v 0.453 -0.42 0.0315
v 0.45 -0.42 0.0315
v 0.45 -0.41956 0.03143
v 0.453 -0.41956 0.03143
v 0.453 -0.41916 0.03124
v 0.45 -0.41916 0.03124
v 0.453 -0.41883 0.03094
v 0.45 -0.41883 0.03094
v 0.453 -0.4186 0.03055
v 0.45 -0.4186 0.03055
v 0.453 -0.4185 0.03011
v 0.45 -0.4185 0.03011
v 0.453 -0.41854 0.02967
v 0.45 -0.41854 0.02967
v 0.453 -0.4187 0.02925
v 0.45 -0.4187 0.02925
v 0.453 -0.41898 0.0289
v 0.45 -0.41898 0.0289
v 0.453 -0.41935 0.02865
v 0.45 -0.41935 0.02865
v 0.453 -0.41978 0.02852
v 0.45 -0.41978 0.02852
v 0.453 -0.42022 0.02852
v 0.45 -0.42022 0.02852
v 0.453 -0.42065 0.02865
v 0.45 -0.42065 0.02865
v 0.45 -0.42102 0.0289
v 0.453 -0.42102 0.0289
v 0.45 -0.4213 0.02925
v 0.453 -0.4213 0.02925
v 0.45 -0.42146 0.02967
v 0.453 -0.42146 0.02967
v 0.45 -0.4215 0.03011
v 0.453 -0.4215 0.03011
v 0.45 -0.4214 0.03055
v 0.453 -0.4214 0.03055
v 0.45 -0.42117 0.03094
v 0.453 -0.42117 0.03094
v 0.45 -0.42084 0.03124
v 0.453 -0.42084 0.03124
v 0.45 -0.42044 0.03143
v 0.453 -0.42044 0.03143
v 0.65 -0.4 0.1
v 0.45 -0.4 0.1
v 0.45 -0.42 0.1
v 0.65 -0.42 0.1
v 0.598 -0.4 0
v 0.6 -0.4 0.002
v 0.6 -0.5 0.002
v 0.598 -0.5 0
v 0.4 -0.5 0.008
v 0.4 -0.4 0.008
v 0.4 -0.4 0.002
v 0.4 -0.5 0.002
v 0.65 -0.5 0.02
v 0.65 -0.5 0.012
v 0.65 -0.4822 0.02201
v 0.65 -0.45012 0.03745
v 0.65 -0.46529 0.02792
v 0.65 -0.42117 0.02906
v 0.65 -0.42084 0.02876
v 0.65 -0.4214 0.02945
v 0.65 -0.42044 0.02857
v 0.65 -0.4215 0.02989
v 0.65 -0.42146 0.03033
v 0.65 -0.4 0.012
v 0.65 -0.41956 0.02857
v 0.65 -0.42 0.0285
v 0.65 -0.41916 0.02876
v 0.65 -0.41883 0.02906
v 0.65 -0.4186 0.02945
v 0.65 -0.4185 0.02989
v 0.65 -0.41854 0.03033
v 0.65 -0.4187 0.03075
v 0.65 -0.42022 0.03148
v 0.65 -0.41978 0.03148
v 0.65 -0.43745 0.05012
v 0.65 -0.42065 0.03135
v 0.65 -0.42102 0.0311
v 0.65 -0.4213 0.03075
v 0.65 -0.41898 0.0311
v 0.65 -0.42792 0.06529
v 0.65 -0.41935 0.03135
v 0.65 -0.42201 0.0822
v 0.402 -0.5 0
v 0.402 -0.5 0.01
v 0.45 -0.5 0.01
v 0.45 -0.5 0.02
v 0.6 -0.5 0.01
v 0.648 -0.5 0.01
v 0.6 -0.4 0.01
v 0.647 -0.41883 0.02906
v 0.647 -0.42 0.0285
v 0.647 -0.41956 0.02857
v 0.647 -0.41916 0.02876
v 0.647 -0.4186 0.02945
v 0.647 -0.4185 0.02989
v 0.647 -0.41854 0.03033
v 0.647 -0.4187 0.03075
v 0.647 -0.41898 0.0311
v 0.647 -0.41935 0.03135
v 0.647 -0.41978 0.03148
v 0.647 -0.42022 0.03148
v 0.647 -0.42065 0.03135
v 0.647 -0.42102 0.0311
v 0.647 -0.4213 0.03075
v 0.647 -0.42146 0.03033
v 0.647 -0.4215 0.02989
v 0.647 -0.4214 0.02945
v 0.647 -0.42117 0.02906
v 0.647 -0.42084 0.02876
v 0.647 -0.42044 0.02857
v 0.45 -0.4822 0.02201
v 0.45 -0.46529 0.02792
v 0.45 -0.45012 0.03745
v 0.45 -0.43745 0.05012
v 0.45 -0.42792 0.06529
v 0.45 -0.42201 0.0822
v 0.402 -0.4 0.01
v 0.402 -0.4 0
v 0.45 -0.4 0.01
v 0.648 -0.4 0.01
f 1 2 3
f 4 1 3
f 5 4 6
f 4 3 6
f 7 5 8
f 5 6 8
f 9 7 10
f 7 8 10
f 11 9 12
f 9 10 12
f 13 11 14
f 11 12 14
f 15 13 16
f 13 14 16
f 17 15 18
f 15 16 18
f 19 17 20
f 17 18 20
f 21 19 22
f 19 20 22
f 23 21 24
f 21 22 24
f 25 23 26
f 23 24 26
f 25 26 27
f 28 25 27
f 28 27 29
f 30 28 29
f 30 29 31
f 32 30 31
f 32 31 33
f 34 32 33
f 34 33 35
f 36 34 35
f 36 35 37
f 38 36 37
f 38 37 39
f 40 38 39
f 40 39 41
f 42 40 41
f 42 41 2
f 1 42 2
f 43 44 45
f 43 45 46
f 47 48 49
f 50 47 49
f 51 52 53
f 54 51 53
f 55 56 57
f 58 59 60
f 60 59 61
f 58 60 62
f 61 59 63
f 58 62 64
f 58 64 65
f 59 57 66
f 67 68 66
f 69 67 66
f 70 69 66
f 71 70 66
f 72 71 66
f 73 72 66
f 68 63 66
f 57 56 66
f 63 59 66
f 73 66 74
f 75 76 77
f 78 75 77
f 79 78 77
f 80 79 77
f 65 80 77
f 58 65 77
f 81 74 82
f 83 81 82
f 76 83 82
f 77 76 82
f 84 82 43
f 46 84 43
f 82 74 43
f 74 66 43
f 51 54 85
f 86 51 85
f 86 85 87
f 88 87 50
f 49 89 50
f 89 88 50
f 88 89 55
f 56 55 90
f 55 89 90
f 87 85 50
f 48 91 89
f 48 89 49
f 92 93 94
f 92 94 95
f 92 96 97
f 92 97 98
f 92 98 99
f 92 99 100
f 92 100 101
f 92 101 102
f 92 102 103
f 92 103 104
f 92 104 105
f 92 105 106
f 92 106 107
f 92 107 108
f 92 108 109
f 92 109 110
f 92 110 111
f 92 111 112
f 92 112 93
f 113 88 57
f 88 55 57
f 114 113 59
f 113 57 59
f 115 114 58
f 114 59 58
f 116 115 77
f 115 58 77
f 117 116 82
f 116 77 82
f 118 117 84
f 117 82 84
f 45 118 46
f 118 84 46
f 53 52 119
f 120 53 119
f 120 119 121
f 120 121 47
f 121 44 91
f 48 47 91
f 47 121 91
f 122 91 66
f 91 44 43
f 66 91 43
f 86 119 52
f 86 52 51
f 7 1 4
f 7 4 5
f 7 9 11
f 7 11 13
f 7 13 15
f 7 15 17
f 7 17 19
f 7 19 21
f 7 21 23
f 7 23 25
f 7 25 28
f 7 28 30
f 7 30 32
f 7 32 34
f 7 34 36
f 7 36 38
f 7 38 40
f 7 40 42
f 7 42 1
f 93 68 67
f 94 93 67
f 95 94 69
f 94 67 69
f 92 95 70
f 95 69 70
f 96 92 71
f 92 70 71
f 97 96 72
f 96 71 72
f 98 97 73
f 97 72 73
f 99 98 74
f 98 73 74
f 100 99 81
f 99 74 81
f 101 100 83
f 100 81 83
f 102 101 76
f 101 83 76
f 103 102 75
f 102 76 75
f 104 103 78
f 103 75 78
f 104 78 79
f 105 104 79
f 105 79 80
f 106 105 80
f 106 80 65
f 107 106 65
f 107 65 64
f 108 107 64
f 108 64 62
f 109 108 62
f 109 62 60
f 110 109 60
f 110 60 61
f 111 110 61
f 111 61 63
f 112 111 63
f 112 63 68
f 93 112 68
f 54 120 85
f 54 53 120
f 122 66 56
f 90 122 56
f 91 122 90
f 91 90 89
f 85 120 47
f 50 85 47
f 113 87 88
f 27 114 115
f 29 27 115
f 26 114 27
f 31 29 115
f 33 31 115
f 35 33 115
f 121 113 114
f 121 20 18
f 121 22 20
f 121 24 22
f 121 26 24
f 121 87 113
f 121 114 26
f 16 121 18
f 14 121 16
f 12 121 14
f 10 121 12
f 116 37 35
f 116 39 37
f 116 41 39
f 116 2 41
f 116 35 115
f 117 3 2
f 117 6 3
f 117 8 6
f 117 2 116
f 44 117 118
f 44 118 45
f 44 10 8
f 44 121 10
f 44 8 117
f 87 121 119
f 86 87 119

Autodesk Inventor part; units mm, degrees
ref_plane "YZ Plane" through (0, 0, 0) normal (1, 0, 0) x (0, 1, 0)
ref_plane "XZ Plane" through (0, 0, 0) normal (0, 1, 0) x (-1, 0, 0)
sketch "스케치1" plane through (0, 0, 0) normal (0, 0, 1) x (1, 0, 0)
  line L0 (-0.15, 0) -> (0.9, 0) construction
  line L1 (0, -0.7) -> (0, 0.7) construction
  line L2 (0.25, -0.5) -> (0.75, -0.5)
  line L3 (0.75, -0.5) -> (0.75, 0.5)
  line L4 (0.75, 0.5) -> (0.25, 0.5)
  line L5 (0.25, 0.5) -> (0.25, -0.5)
  point P0 (0, 0)
  point P1 (0.5, -0.5)
  dimension "d7" = 0.5
  dimension "d8" = 1
  dimension "d9" = 0.25
extrude "돌출1" add sketch "스케치1" along normal blind 0.1
sketch "스케치3" plane through (0.25, 0.5, 0) normal (0, 1, 0) x (1, 0, 0)
  line L0 (-0.25, 0.7571) -> (-0.25, -0.2929) construction
  line L1 (-0.4, 0) -> (0.65, 0) construction
  line L2 (0.5, 0) -> (0, 0) projected
  line L3 (0, 0) -> (0, -0.1) projected
  line L4 (0.5, -0.1) -> (0, -0.1) projected
  line L5 (0.5, 0) -> (0.5, -0.1) projected
  arc A0 (0, -0.1) -> (0.5, -0.1) centre (0.25, 0.6071) ccw
  line L6 (0.25, -0.1) -> (0.25, 0.4799) construction
  point P0 (-0.25, 0)
  dimension "d10" = 0.75
sketch "스케치5" plane through (0, 0, 0.1) normal (0, 0, 1) x (1, 0, 0)
  line L0 (0.75, -0.5) -> (0.75, 0.5) projected
  line L1 (0.75, 0.5) -> (0.25, 0.5) projected
  line L2 (0.25, 0.5) -> (0.25, -0.5) projected
  line L3 (0.25, -0.5) -> (0.75, -0.5) projected
  line L4 (-0.15, 0) -> (0.9, 0) construction
  line L5 (0, -0.7) -> (0, 0.7) construction
  line L6 (-0.15, 0) -> (0.9, 0) construction
  line L7 (0, 0.7) -> (0, -0.7) construction
  line L8 (0.75, 0.4) -> (0.25, 0.4)
  line L9 (0.75, -0.4) -> (0.25, -0.4)
  point P0 (0, 0)
  dimension "d18" = 1
  dimension "d19" = 0.4
sketch "스케치6" plane through (0.75, -0.5, 0) normal (1, 0, 0) x (0, 0, -1)
  line L0 (0, 0) -> (0, 1) projected
  line L1 (0, 1) -> (-0.1, 1) projected
  line L2 (-0.1, 0) -> (-0.1, 1) projected
  line L3 (0, 0) -> (-0.1, 0) projected
  line L4 (0, 0.5) -> (-0.1, 0.5) construction
  line L5 (0, 0.92) -> (-0.1, 0.92)
  arc A0 (-0.1, 0.92) -> (-0.02, 1) centre (-0.1, 1) ccw
  arc A1 (-0.02, 0) -> (-0.1, 0.08) centre (-0.1, 0) ccw
  point P0 (-0.05, 0.5)
  point P1 (-0.05, 0.92)
  point P2 (-0.02, 0)
  point P3 (-0.1, 0.08)
  dimension "d20" = 0.42
extrude "돌출5" cut sketch "스케치6" against normal up to surface (0.5 mm away) contours L3 L2 A1 | L2 L1 A0
sketch "스케치7" plane through (0.75, -0.5, 0) normal (1, 0, 0) x (0, 0, -1)
  arc A0 (-0.1, 0.92) -> (-0.02, 1) centre (-0.1, 1) ccw projected
  line L0 (-0.1, 0.08) -> (-0.1, 0.92) projected
  arc A1 (-0.02, 0) -> (-0.1, 0.08) centre (-0.1, 0) ccw projected
  line L1 (0, 0) -> (-0.02, 0) projected
  line L2 (0, 0) -> (0, 1) projected
  line L3 (0, 1) -> (-0.02, 1) projected
  line L4 (0, 0.5) -> (-0.2526, 0.5) construction
  line L5 (-0.2526, 0.5) -> (-0.2526, 0.9) construction
  line L6 (-0.2526, 0.9) -> (-0.1, 0.9) construction
  line L7 (-0.2526, 0.1) -> (-0.1, 0.1) construction
  dimension "d23" = 0.4
ref_plane "작업 평면1" through (0.25, -0.4, 0) normal (0, -1, 0) x (1, 0, 0)
sketch "스케치8" plane through (0.25, -0.4, 0) normal (0, -1, 0) x (1, 0, 0)
  line L0 (0, 0.02) -> (0, 0.1) projected
  line L1 (0.5, 0.02) -> (0, 0.02) projected
  line L2 (0.5, 0.1) -> (0.5, 0.02) projected
  line L3 (0, 0.1) -> (0.5, 0.1) projected
  line L4 (0.5, 0.02) -> (0, 0.02) projected
  line L5 (0, 0) -> (0, 0.02) projected
  line L6 (0, 0) -> (0.5, 0) projected
  line L7 (0.5, 0) -> (0.5, 0.02) projected
  point P0 (-0.25, 0)
  point P1 (0.5, 0.02)
  point P2 (0, 0.02)
extrude "돌출6" cut sketch "스케치8" against normal blind 10
sketch "스케치9" plane through (0.25, -0.4, 0) normal (0, 1, 0) x (1, 0, 0)
  line L0 (0.5, 0) -> (0.5, -0.1) projected
  line L1 (0, 0) -> (0.5, 0) projected
  line L2 (0, -0.1) -> (0, 0) projected
  line L3 (0.5, -0.1) -> (0, -0.1) projected
  line L4 (0, 0) -> (0.5, 0) construction
  line L5 (0.2, 0) -> (0.2, -0.1) construction
  line L6 (0.2, -0.1) -> (0.2, -0.0922)
  line L7 (0.2, -0.01) -> (0.15, -0.01)
  line L8 (0.15, -0.01) -> (0.15, 0)
  line L9 (0.4, 0) -> (0.4, -0.1) construction
  line L10 (0.5, -0.1) -> (0, -0.1) construction
  line L11 (0.4, -0.01) -> (0.35, -0.01)
  line L12 (0.35, -0.01) -> (0.35, 0)
  line L13 (0.4, -0.01) -> (0.4, -0.1)
  line L14 (0.2, -0.01) -> (0.2, -0.1)
  point P0 (-0.25, 0)
  point P1 (0, -0.05)
  point P2 (0.15, 0)
  dimension "d27" = 0.2
  dimension "d28" = 0.01
  dimension "d29" = 0.2
  dimension "d30" = 0.05
  dimension "d31" = 0.05
extrude "돌출7" cut sketch "스케치9" against normal through all contours L0 L3 L13 L11 L12 L1 | L8 L7 L14 L6 L3 L2 L1
chamfer "모따기1" distance 0.002 angle 45 2 edges at (0.4, -0.45, 0) (0.4, -0.45, 0.01)
chamfer "모따기2" distance 0.002 angle 45 2 edges at (0.65, -0.45, 0.01) (0.6, -0.45, 0)
sketch "스케치10" plane through (0.45, -0.4, 0.01) normal (-1, 0, 0) x (0, 0, 1)
  line L0 (0.01, -0.1) -> (0, -0.1) projected
  arc A0 (0.09, -0.02) -> (0.01, -0.1) centre (0.09, -0.1) ccw projected
  line L1 (0.09, 0) -> (0.09, -0.02) projected
  line L2 (0, 0) -> (0.09, 0) projected
  line L3 (0, 0) -> (0, -0.1) projected
  line L4 (0.02, 0) -> (0.02, -0.02) construction
  line L5 (0.02, -0.02) -> (0, -0.02) construction
  circle A1 centre (0.02, -0.02) radius 0.0015
  point P0 (-0.01, 0.4)
  dimension "d40" = 0.02
  dimension "d41" = 0.02
  dimension "d42" = 0.003
sketch "스케치11" plane through (0.65, -0.42, 0.1) normal (1, 0, 0) x (0, 0, -1)
  line L0 (0.09, -0.08) -> (0.09, 0.02) projected
  line L1 (0, 0.02) -> (0.088, 0.02) projected
  line L2 (0.09, 0.02) -> (0.09, -0.08) construction
  line L3 (0.09, 0) -> (0.07, 0) construction
  line L4 (0.07, 0) -> (0.07, 0.02) construction
  circle A0 centre (0.07, 0) radius 0.0015
  point P0 (0.1, 0.42)
  dimension "d43" = 0.02
  dimension "d44" = 0.02
  dimension "d45" = 0.003
extrude "돌출8" cut sketch "스케치11" against normal blind 0.003
extrude "돌출9" cut sketch "스케치10" against normal blind 0.003 contours A1
properties part number "flat_surface_1"
